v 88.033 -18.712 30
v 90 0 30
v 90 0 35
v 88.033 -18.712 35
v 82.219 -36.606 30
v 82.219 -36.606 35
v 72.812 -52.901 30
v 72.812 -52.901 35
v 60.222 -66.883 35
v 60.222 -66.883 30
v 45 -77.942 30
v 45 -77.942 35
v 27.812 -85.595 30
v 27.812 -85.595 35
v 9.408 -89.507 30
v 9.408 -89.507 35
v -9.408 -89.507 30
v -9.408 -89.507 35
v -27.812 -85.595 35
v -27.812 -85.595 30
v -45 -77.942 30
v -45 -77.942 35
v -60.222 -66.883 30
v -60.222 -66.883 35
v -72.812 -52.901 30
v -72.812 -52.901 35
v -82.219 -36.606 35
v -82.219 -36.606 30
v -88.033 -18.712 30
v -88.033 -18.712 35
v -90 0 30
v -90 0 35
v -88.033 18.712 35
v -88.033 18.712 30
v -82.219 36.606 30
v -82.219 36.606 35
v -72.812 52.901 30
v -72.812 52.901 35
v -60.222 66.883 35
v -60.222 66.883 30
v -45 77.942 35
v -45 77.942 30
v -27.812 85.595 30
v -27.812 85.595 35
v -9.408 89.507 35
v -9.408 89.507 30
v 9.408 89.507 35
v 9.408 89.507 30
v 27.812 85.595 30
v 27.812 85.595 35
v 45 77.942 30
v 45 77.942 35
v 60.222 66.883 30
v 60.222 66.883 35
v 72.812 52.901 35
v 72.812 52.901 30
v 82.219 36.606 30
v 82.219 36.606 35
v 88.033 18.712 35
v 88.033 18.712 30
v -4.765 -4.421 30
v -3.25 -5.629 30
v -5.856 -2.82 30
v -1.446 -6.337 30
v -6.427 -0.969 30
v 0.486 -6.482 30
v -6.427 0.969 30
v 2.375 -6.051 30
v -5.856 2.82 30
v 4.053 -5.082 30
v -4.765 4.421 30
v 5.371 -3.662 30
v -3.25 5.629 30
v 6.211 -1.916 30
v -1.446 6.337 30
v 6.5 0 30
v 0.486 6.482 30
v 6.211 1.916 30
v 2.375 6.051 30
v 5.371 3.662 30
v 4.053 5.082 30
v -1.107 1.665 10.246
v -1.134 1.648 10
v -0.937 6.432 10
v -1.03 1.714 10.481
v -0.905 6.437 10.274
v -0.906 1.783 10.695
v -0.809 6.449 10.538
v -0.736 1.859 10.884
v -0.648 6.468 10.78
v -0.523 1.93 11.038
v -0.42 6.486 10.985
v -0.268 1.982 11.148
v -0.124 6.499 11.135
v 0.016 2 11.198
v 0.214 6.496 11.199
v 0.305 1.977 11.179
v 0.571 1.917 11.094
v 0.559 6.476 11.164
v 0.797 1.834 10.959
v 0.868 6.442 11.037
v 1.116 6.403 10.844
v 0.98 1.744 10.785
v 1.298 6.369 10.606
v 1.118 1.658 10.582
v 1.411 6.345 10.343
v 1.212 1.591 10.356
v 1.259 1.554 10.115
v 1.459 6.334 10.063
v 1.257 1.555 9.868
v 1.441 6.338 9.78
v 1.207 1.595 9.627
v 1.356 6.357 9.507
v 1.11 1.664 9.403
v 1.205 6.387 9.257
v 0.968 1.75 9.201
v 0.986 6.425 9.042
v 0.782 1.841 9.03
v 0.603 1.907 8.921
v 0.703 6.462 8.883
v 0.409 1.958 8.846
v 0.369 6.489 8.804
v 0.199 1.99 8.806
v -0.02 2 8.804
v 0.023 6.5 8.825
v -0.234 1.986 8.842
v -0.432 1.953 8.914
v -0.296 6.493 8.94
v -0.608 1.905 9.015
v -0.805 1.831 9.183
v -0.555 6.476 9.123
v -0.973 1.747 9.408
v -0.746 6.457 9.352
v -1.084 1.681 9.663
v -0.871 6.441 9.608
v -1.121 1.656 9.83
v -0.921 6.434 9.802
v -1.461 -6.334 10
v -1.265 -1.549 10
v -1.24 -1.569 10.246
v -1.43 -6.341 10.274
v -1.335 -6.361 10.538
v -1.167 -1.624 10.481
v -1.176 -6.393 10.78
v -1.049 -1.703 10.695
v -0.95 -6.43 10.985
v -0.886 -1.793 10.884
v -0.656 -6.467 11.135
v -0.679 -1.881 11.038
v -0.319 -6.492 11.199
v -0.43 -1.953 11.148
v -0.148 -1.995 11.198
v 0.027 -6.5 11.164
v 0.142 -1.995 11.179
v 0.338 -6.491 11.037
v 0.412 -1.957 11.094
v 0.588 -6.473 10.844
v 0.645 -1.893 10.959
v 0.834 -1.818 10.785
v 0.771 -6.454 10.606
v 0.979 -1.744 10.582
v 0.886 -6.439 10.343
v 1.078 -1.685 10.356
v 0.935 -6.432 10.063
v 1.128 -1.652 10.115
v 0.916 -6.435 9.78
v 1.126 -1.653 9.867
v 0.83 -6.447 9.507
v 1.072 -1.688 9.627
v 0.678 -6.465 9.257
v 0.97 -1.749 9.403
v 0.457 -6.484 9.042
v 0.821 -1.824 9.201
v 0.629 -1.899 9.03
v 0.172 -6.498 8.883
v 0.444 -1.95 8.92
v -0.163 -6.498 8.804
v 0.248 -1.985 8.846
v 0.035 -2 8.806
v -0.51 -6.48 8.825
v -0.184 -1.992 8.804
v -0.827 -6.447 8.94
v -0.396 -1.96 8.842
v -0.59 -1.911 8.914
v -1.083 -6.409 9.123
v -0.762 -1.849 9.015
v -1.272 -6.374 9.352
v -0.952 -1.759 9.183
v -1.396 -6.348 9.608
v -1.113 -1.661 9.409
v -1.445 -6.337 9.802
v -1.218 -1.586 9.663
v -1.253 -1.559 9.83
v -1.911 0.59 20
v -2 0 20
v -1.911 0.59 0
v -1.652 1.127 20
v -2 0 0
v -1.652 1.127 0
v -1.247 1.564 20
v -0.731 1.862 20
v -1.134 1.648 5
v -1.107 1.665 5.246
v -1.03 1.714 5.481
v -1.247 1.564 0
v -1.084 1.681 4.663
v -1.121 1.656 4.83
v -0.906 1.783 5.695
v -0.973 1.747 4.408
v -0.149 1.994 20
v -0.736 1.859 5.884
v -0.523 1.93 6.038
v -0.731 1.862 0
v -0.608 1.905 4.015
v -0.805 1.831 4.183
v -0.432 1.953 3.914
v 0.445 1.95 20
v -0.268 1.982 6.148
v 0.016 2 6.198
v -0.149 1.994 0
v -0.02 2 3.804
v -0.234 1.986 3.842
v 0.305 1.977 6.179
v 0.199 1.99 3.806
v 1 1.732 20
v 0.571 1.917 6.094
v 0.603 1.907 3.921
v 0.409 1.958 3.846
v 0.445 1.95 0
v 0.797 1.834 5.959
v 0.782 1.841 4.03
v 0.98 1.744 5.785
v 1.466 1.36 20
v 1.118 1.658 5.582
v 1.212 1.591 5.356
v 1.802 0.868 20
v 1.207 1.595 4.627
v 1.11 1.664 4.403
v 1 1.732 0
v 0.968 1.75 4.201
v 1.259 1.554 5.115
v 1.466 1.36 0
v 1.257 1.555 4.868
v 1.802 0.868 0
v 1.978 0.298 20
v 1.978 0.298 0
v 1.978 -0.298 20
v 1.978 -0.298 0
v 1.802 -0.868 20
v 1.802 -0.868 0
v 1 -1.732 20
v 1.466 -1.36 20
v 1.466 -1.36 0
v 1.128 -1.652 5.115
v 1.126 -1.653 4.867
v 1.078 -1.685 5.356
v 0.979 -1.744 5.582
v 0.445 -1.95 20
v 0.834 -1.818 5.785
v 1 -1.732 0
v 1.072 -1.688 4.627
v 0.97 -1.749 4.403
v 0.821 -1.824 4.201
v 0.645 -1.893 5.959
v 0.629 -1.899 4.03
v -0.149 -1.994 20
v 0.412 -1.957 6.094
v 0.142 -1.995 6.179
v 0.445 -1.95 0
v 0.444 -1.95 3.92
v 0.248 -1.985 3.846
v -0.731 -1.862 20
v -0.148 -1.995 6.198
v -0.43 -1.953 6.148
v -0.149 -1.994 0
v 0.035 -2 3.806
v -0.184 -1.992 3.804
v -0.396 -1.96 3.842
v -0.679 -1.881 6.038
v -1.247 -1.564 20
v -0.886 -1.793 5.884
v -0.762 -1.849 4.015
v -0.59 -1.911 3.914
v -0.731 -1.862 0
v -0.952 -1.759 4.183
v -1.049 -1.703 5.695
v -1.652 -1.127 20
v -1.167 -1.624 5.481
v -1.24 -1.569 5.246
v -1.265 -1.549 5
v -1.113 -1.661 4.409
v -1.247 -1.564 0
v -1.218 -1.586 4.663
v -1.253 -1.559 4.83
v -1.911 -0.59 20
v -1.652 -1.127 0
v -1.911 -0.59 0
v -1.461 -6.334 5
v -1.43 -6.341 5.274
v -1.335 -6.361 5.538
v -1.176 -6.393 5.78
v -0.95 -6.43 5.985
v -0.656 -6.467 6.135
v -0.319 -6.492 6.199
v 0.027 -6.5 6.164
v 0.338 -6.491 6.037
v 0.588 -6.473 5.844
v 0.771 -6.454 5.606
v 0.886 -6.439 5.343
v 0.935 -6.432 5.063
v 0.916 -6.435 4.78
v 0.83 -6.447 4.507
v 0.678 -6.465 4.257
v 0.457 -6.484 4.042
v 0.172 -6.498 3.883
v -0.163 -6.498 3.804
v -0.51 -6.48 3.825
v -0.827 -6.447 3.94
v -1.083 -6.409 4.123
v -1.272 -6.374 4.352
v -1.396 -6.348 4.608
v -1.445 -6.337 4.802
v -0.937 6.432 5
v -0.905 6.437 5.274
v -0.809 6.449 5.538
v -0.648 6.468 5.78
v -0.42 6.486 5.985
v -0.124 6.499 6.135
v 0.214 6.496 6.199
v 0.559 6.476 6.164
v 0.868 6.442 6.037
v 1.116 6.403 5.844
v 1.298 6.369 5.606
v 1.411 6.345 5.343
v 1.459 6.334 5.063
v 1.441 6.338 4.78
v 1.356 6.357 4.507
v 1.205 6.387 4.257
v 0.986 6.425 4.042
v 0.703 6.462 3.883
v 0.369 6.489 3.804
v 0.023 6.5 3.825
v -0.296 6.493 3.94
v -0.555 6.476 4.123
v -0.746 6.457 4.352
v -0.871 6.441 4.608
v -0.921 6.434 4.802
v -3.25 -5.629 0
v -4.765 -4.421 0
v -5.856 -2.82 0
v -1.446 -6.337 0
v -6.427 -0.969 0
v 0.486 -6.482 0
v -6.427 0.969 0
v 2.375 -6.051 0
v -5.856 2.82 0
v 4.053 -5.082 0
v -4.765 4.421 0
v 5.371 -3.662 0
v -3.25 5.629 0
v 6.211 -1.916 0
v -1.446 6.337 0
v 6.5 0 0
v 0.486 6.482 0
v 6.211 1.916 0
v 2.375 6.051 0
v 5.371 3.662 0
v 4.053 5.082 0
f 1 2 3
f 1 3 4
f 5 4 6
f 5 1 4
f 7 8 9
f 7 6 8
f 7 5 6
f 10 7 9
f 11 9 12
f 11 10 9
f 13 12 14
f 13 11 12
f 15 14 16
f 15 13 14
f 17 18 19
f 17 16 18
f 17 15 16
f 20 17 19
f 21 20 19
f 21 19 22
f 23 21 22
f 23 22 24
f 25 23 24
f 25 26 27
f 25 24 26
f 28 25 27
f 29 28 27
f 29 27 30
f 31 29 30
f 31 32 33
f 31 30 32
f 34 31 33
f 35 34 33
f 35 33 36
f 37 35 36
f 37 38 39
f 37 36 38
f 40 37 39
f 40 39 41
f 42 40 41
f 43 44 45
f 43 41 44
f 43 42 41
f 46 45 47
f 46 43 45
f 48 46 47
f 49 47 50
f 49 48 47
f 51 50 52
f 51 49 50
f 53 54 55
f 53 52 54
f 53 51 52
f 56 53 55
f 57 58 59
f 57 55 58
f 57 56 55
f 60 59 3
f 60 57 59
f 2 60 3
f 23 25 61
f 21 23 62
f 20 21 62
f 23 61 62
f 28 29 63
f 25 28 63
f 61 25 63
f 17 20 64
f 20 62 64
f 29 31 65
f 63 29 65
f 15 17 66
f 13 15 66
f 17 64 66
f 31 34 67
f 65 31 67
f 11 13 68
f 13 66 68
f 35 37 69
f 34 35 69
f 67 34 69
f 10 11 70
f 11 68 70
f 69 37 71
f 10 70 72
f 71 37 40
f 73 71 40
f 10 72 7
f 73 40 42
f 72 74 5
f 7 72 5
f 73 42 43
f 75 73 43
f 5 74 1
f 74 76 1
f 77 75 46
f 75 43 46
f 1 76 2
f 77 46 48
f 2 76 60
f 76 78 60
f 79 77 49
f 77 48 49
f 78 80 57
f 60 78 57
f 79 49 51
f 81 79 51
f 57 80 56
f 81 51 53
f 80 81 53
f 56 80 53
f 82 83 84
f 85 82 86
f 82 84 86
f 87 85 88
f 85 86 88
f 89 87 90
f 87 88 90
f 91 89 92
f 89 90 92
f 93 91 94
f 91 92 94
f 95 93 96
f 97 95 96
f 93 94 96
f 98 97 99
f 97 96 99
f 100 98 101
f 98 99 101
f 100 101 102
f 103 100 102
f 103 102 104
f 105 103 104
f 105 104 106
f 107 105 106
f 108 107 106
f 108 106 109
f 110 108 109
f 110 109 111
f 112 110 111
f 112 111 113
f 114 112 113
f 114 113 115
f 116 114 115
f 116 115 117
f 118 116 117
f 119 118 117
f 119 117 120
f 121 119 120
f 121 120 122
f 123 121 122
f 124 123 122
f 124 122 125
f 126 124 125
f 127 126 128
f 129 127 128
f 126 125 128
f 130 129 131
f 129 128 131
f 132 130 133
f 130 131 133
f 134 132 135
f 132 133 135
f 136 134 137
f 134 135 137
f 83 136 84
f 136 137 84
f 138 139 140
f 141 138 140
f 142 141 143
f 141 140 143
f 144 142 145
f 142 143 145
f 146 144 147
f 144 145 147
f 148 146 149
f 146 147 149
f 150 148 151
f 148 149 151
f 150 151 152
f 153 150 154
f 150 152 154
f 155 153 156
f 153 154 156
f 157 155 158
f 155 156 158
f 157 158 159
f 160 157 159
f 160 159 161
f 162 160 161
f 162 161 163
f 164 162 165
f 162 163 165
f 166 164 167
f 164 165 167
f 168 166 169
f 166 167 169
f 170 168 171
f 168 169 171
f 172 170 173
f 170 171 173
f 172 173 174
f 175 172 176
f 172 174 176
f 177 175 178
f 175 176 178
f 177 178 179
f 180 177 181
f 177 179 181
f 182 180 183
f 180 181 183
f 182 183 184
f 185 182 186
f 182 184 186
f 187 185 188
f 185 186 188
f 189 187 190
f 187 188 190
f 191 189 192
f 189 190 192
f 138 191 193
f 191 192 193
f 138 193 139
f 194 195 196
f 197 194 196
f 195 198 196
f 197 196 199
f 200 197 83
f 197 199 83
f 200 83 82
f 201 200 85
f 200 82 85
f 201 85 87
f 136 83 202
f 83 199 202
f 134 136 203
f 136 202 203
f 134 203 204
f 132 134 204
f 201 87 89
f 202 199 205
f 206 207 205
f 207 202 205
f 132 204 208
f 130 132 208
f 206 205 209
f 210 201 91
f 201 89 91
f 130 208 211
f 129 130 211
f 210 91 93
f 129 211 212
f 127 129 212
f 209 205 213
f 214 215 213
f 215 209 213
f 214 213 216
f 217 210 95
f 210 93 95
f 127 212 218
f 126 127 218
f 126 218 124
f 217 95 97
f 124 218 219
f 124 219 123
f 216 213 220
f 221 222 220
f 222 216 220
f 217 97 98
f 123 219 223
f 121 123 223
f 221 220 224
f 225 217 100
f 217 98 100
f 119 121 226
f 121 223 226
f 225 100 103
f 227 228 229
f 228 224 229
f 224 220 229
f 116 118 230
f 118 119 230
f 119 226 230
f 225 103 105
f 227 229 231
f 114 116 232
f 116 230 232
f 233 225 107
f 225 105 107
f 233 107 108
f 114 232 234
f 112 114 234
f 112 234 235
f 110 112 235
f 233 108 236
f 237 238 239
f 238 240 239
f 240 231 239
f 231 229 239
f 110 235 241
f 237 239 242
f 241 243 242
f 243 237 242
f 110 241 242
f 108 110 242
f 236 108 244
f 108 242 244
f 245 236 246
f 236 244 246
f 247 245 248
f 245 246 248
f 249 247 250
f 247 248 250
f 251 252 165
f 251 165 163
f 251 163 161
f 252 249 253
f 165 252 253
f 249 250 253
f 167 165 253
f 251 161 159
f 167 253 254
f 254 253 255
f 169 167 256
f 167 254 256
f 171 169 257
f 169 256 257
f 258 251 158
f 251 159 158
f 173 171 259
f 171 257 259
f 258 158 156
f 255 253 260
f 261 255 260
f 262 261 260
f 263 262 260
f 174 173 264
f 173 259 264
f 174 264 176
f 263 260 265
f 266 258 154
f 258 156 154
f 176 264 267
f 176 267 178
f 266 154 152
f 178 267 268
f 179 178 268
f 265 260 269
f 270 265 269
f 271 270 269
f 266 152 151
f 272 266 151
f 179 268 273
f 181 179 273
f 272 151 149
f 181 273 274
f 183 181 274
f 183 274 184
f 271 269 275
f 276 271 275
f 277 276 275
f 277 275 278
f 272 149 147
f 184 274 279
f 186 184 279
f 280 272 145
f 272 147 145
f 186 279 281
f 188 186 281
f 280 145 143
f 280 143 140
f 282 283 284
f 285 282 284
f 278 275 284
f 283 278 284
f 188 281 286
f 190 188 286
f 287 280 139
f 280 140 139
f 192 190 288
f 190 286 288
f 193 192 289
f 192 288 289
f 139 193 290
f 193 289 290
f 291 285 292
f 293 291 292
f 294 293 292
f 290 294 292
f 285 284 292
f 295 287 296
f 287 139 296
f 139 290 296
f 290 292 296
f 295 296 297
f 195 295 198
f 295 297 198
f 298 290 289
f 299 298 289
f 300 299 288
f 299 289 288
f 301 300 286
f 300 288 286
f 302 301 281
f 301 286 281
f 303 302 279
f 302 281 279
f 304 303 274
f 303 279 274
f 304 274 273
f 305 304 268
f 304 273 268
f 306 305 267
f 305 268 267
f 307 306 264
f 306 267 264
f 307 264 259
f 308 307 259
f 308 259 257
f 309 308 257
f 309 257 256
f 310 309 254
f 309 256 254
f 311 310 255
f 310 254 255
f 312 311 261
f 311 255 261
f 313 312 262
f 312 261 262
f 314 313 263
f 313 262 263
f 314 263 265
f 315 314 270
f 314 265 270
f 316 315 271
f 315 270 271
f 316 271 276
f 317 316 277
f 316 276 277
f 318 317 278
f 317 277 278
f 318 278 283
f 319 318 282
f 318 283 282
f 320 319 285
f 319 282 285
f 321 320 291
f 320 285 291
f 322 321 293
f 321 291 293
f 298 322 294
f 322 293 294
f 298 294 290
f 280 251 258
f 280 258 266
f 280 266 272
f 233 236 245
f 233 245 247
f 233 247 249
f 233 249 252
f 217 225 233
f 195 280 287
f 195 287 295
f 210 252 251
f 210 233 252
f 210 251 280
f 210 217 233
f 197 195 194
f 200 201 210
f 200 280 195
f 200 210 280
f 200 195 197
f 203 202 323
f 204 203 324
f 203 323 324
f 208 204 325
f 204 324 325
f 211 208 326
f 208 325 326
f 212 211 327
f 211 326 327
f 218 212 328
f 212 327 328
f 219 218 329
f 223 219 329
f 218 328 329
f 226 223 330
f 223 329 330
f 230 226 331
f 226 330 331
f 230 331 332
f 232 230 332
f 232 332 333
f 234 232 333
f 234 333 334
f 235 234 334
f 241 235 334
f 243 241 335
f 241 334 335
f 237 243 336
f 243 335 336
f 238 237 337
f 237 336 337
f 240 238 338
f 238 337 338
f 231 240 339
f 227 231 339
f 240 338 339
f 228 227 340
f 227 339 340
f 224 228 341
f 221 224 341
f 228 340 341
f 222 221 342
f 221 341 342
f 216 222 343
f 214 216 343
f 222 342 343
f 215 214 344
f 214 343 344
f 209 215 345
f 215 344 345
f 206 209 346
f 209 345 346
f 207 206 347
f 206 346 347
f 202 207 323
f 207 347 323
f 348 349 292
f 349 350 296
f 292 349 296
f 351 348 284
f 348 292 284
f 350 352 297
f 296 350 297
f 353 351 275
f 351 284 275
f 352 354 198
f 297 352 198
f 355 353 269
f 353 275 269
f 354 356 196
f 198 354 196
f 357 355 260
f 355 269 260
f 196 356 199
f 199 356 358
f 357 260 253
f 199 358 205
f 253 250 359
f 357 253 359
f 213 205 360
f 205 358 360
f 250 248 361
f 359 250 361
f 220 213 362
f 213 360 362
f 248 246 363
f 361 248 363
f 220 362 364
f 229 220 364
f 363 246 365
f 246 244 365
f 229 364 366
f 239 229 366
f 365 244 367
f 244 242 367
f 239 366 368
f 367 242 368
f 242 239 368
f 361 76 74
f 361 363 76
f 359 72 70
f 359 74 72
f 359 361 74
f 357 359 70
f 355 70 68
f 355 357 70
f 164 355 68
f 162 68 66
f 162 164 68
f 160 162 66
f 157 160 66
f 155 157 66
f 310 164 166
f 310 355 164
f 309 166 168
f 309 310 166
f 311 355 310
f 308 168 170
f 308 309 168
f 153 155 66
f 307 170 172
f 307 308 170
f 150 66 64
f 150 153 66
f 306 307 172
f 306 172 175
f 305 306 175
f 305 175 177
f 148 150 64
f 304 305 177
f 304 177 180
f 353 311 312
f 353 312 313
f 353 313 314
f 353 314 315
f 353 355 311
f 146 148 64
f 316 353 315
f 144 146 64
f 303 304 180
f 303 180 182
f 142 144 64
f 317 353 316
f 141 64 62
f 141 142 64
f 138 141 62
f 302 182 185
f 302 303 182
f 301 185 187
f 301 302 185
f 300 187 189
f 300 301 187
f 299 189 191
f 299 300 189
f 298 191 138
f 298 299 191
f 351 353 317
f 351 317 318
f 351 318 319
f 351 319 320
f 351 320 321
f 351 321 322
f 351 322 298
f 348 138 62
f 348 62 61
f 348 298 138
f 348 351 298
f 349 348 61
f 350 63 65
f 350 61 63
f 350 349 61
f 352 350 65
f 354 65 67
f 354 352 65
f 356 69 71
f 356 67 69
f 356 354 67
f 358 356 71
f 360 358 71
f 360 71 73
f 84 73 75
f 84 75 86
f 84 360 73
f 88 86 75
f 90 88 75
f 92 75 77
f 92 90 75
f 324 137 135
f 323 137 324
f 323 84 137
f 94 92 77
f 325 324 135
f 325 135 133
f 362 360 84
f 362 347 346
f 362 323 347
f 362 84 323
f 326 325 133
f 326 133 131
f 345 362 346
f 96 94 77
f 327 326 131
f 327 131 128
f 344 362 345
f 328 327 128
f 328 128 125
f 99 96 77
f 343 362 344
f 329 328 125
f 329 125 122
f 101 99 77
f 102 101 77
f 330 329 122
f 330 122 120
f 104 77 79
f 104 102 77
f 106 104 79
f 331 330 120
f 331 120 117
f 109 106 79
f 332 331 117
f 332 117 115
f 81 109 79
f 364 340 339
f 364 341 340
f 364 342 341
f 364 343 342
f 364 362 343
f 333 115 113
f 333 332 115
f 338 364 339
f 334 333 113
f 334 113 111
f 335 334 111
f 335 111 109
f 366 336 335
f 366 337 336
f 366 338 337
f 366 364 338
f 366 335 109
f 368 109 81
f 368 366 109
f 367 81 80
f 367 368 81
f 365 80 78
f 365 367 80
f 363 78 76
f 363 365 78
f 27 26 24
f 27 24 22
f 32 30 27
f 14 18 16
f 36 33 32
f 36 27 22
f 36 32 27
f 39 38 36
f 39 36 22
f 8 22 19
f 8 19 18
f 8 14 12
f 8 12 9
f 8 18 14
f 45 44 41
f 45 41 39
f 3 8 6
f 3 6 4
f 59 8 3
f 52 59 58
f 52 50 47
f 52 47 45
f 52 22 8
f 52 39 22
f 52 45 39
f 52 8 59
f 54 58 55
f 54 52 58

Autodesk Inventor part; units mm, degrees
ref_plane "YZ Plane" through (0, 0, 0) normal (1, 0, 0) x (0, 1, 0)
ref_plane "XZ Plane" through (0, 0, 0) normal (0, 1, 0) x (-1, 0, 0)
ref_plane "XY Plane" through (0, 0, 0) normal (0, 0, 1) x (1, 0, 0)
sketch "Sketch1" plane through (0, 0, 0) normal (0, 0, 1) x (1, 0, 0)
  circle A0 centre (0, 0) radius 6.5
  dimension "d0" = 13
extrude "Extrusion1" add sketch "Sketch1" along normal blind 30
sketch "Sketch3" plane through (0, 0, 30) normal (0, 0, 1) x (1, 0, 0)
  circle A0 centre (0, 0) radius 90
  dimension "d3" = 180
sketch "Sketch4" plane through (0, 0, 0) normal (0, 0, -1) x (-1, 0, 0)
  circle A0 centre (0, 0) radius 2
  dimension "d4" = 4
extrude "Extrusion2" cut sketch "Sketch4" against normal blind 20
ref_plane "Work Plane2" through (0.2663, 6.4945, 0) normal (0.041, 0.9992, 0) x (-0.9992, 0.041, 0)
ref_plane "Work Plane1" through (-27.6829, 45.9903, 12) normal (0.041, 0.9992, 0) x (-0.9992, 0.041, 0)
ref_plane "Work Plane4" through (0.2663, 6.4945, 0) normal (0.041, 0.9992, 0) x (-0.9992, 0.041, 0)
ref_plane "Work Plane3" through (19.1559, -19.777, -43.8) normal (0.041, 0.9992, 0) x (-0.9992, 0.041, 0)
sketch "Sketch5" plane through (0.2663, 6.4945, 0) normal (0.041, 0.9992, 0) x (-0.9992, 0.041, 0)
  line L0 (0, 0) -> (0, 20)
  line L1 (0, 20) -> (0, 5)
  line L2 (0, 5) -> (0, 10)
  circle A0 centre (0, 10) radius 1.2
  circle A1 centre (0, 5) radius 1.2
  dimension "d7" = 20
  dimension "d8" = 15
  dimension "d9" = 5
  dimension "d10" = 2.4
extrude "Extrusion3" cut sketch "Sketch5" against normal blind 20
sketch "Sketch6" plane through (0, 0, 30) normal (0, 0, 1) x (1, 0, 0)
  circle A0 centre (0, 0) radius 90
  dimension "d13" = 180
extrude "Extrusion4" add sketch "Sketch6" along normal blind 5
properties part number "plošča za vrtenje"
